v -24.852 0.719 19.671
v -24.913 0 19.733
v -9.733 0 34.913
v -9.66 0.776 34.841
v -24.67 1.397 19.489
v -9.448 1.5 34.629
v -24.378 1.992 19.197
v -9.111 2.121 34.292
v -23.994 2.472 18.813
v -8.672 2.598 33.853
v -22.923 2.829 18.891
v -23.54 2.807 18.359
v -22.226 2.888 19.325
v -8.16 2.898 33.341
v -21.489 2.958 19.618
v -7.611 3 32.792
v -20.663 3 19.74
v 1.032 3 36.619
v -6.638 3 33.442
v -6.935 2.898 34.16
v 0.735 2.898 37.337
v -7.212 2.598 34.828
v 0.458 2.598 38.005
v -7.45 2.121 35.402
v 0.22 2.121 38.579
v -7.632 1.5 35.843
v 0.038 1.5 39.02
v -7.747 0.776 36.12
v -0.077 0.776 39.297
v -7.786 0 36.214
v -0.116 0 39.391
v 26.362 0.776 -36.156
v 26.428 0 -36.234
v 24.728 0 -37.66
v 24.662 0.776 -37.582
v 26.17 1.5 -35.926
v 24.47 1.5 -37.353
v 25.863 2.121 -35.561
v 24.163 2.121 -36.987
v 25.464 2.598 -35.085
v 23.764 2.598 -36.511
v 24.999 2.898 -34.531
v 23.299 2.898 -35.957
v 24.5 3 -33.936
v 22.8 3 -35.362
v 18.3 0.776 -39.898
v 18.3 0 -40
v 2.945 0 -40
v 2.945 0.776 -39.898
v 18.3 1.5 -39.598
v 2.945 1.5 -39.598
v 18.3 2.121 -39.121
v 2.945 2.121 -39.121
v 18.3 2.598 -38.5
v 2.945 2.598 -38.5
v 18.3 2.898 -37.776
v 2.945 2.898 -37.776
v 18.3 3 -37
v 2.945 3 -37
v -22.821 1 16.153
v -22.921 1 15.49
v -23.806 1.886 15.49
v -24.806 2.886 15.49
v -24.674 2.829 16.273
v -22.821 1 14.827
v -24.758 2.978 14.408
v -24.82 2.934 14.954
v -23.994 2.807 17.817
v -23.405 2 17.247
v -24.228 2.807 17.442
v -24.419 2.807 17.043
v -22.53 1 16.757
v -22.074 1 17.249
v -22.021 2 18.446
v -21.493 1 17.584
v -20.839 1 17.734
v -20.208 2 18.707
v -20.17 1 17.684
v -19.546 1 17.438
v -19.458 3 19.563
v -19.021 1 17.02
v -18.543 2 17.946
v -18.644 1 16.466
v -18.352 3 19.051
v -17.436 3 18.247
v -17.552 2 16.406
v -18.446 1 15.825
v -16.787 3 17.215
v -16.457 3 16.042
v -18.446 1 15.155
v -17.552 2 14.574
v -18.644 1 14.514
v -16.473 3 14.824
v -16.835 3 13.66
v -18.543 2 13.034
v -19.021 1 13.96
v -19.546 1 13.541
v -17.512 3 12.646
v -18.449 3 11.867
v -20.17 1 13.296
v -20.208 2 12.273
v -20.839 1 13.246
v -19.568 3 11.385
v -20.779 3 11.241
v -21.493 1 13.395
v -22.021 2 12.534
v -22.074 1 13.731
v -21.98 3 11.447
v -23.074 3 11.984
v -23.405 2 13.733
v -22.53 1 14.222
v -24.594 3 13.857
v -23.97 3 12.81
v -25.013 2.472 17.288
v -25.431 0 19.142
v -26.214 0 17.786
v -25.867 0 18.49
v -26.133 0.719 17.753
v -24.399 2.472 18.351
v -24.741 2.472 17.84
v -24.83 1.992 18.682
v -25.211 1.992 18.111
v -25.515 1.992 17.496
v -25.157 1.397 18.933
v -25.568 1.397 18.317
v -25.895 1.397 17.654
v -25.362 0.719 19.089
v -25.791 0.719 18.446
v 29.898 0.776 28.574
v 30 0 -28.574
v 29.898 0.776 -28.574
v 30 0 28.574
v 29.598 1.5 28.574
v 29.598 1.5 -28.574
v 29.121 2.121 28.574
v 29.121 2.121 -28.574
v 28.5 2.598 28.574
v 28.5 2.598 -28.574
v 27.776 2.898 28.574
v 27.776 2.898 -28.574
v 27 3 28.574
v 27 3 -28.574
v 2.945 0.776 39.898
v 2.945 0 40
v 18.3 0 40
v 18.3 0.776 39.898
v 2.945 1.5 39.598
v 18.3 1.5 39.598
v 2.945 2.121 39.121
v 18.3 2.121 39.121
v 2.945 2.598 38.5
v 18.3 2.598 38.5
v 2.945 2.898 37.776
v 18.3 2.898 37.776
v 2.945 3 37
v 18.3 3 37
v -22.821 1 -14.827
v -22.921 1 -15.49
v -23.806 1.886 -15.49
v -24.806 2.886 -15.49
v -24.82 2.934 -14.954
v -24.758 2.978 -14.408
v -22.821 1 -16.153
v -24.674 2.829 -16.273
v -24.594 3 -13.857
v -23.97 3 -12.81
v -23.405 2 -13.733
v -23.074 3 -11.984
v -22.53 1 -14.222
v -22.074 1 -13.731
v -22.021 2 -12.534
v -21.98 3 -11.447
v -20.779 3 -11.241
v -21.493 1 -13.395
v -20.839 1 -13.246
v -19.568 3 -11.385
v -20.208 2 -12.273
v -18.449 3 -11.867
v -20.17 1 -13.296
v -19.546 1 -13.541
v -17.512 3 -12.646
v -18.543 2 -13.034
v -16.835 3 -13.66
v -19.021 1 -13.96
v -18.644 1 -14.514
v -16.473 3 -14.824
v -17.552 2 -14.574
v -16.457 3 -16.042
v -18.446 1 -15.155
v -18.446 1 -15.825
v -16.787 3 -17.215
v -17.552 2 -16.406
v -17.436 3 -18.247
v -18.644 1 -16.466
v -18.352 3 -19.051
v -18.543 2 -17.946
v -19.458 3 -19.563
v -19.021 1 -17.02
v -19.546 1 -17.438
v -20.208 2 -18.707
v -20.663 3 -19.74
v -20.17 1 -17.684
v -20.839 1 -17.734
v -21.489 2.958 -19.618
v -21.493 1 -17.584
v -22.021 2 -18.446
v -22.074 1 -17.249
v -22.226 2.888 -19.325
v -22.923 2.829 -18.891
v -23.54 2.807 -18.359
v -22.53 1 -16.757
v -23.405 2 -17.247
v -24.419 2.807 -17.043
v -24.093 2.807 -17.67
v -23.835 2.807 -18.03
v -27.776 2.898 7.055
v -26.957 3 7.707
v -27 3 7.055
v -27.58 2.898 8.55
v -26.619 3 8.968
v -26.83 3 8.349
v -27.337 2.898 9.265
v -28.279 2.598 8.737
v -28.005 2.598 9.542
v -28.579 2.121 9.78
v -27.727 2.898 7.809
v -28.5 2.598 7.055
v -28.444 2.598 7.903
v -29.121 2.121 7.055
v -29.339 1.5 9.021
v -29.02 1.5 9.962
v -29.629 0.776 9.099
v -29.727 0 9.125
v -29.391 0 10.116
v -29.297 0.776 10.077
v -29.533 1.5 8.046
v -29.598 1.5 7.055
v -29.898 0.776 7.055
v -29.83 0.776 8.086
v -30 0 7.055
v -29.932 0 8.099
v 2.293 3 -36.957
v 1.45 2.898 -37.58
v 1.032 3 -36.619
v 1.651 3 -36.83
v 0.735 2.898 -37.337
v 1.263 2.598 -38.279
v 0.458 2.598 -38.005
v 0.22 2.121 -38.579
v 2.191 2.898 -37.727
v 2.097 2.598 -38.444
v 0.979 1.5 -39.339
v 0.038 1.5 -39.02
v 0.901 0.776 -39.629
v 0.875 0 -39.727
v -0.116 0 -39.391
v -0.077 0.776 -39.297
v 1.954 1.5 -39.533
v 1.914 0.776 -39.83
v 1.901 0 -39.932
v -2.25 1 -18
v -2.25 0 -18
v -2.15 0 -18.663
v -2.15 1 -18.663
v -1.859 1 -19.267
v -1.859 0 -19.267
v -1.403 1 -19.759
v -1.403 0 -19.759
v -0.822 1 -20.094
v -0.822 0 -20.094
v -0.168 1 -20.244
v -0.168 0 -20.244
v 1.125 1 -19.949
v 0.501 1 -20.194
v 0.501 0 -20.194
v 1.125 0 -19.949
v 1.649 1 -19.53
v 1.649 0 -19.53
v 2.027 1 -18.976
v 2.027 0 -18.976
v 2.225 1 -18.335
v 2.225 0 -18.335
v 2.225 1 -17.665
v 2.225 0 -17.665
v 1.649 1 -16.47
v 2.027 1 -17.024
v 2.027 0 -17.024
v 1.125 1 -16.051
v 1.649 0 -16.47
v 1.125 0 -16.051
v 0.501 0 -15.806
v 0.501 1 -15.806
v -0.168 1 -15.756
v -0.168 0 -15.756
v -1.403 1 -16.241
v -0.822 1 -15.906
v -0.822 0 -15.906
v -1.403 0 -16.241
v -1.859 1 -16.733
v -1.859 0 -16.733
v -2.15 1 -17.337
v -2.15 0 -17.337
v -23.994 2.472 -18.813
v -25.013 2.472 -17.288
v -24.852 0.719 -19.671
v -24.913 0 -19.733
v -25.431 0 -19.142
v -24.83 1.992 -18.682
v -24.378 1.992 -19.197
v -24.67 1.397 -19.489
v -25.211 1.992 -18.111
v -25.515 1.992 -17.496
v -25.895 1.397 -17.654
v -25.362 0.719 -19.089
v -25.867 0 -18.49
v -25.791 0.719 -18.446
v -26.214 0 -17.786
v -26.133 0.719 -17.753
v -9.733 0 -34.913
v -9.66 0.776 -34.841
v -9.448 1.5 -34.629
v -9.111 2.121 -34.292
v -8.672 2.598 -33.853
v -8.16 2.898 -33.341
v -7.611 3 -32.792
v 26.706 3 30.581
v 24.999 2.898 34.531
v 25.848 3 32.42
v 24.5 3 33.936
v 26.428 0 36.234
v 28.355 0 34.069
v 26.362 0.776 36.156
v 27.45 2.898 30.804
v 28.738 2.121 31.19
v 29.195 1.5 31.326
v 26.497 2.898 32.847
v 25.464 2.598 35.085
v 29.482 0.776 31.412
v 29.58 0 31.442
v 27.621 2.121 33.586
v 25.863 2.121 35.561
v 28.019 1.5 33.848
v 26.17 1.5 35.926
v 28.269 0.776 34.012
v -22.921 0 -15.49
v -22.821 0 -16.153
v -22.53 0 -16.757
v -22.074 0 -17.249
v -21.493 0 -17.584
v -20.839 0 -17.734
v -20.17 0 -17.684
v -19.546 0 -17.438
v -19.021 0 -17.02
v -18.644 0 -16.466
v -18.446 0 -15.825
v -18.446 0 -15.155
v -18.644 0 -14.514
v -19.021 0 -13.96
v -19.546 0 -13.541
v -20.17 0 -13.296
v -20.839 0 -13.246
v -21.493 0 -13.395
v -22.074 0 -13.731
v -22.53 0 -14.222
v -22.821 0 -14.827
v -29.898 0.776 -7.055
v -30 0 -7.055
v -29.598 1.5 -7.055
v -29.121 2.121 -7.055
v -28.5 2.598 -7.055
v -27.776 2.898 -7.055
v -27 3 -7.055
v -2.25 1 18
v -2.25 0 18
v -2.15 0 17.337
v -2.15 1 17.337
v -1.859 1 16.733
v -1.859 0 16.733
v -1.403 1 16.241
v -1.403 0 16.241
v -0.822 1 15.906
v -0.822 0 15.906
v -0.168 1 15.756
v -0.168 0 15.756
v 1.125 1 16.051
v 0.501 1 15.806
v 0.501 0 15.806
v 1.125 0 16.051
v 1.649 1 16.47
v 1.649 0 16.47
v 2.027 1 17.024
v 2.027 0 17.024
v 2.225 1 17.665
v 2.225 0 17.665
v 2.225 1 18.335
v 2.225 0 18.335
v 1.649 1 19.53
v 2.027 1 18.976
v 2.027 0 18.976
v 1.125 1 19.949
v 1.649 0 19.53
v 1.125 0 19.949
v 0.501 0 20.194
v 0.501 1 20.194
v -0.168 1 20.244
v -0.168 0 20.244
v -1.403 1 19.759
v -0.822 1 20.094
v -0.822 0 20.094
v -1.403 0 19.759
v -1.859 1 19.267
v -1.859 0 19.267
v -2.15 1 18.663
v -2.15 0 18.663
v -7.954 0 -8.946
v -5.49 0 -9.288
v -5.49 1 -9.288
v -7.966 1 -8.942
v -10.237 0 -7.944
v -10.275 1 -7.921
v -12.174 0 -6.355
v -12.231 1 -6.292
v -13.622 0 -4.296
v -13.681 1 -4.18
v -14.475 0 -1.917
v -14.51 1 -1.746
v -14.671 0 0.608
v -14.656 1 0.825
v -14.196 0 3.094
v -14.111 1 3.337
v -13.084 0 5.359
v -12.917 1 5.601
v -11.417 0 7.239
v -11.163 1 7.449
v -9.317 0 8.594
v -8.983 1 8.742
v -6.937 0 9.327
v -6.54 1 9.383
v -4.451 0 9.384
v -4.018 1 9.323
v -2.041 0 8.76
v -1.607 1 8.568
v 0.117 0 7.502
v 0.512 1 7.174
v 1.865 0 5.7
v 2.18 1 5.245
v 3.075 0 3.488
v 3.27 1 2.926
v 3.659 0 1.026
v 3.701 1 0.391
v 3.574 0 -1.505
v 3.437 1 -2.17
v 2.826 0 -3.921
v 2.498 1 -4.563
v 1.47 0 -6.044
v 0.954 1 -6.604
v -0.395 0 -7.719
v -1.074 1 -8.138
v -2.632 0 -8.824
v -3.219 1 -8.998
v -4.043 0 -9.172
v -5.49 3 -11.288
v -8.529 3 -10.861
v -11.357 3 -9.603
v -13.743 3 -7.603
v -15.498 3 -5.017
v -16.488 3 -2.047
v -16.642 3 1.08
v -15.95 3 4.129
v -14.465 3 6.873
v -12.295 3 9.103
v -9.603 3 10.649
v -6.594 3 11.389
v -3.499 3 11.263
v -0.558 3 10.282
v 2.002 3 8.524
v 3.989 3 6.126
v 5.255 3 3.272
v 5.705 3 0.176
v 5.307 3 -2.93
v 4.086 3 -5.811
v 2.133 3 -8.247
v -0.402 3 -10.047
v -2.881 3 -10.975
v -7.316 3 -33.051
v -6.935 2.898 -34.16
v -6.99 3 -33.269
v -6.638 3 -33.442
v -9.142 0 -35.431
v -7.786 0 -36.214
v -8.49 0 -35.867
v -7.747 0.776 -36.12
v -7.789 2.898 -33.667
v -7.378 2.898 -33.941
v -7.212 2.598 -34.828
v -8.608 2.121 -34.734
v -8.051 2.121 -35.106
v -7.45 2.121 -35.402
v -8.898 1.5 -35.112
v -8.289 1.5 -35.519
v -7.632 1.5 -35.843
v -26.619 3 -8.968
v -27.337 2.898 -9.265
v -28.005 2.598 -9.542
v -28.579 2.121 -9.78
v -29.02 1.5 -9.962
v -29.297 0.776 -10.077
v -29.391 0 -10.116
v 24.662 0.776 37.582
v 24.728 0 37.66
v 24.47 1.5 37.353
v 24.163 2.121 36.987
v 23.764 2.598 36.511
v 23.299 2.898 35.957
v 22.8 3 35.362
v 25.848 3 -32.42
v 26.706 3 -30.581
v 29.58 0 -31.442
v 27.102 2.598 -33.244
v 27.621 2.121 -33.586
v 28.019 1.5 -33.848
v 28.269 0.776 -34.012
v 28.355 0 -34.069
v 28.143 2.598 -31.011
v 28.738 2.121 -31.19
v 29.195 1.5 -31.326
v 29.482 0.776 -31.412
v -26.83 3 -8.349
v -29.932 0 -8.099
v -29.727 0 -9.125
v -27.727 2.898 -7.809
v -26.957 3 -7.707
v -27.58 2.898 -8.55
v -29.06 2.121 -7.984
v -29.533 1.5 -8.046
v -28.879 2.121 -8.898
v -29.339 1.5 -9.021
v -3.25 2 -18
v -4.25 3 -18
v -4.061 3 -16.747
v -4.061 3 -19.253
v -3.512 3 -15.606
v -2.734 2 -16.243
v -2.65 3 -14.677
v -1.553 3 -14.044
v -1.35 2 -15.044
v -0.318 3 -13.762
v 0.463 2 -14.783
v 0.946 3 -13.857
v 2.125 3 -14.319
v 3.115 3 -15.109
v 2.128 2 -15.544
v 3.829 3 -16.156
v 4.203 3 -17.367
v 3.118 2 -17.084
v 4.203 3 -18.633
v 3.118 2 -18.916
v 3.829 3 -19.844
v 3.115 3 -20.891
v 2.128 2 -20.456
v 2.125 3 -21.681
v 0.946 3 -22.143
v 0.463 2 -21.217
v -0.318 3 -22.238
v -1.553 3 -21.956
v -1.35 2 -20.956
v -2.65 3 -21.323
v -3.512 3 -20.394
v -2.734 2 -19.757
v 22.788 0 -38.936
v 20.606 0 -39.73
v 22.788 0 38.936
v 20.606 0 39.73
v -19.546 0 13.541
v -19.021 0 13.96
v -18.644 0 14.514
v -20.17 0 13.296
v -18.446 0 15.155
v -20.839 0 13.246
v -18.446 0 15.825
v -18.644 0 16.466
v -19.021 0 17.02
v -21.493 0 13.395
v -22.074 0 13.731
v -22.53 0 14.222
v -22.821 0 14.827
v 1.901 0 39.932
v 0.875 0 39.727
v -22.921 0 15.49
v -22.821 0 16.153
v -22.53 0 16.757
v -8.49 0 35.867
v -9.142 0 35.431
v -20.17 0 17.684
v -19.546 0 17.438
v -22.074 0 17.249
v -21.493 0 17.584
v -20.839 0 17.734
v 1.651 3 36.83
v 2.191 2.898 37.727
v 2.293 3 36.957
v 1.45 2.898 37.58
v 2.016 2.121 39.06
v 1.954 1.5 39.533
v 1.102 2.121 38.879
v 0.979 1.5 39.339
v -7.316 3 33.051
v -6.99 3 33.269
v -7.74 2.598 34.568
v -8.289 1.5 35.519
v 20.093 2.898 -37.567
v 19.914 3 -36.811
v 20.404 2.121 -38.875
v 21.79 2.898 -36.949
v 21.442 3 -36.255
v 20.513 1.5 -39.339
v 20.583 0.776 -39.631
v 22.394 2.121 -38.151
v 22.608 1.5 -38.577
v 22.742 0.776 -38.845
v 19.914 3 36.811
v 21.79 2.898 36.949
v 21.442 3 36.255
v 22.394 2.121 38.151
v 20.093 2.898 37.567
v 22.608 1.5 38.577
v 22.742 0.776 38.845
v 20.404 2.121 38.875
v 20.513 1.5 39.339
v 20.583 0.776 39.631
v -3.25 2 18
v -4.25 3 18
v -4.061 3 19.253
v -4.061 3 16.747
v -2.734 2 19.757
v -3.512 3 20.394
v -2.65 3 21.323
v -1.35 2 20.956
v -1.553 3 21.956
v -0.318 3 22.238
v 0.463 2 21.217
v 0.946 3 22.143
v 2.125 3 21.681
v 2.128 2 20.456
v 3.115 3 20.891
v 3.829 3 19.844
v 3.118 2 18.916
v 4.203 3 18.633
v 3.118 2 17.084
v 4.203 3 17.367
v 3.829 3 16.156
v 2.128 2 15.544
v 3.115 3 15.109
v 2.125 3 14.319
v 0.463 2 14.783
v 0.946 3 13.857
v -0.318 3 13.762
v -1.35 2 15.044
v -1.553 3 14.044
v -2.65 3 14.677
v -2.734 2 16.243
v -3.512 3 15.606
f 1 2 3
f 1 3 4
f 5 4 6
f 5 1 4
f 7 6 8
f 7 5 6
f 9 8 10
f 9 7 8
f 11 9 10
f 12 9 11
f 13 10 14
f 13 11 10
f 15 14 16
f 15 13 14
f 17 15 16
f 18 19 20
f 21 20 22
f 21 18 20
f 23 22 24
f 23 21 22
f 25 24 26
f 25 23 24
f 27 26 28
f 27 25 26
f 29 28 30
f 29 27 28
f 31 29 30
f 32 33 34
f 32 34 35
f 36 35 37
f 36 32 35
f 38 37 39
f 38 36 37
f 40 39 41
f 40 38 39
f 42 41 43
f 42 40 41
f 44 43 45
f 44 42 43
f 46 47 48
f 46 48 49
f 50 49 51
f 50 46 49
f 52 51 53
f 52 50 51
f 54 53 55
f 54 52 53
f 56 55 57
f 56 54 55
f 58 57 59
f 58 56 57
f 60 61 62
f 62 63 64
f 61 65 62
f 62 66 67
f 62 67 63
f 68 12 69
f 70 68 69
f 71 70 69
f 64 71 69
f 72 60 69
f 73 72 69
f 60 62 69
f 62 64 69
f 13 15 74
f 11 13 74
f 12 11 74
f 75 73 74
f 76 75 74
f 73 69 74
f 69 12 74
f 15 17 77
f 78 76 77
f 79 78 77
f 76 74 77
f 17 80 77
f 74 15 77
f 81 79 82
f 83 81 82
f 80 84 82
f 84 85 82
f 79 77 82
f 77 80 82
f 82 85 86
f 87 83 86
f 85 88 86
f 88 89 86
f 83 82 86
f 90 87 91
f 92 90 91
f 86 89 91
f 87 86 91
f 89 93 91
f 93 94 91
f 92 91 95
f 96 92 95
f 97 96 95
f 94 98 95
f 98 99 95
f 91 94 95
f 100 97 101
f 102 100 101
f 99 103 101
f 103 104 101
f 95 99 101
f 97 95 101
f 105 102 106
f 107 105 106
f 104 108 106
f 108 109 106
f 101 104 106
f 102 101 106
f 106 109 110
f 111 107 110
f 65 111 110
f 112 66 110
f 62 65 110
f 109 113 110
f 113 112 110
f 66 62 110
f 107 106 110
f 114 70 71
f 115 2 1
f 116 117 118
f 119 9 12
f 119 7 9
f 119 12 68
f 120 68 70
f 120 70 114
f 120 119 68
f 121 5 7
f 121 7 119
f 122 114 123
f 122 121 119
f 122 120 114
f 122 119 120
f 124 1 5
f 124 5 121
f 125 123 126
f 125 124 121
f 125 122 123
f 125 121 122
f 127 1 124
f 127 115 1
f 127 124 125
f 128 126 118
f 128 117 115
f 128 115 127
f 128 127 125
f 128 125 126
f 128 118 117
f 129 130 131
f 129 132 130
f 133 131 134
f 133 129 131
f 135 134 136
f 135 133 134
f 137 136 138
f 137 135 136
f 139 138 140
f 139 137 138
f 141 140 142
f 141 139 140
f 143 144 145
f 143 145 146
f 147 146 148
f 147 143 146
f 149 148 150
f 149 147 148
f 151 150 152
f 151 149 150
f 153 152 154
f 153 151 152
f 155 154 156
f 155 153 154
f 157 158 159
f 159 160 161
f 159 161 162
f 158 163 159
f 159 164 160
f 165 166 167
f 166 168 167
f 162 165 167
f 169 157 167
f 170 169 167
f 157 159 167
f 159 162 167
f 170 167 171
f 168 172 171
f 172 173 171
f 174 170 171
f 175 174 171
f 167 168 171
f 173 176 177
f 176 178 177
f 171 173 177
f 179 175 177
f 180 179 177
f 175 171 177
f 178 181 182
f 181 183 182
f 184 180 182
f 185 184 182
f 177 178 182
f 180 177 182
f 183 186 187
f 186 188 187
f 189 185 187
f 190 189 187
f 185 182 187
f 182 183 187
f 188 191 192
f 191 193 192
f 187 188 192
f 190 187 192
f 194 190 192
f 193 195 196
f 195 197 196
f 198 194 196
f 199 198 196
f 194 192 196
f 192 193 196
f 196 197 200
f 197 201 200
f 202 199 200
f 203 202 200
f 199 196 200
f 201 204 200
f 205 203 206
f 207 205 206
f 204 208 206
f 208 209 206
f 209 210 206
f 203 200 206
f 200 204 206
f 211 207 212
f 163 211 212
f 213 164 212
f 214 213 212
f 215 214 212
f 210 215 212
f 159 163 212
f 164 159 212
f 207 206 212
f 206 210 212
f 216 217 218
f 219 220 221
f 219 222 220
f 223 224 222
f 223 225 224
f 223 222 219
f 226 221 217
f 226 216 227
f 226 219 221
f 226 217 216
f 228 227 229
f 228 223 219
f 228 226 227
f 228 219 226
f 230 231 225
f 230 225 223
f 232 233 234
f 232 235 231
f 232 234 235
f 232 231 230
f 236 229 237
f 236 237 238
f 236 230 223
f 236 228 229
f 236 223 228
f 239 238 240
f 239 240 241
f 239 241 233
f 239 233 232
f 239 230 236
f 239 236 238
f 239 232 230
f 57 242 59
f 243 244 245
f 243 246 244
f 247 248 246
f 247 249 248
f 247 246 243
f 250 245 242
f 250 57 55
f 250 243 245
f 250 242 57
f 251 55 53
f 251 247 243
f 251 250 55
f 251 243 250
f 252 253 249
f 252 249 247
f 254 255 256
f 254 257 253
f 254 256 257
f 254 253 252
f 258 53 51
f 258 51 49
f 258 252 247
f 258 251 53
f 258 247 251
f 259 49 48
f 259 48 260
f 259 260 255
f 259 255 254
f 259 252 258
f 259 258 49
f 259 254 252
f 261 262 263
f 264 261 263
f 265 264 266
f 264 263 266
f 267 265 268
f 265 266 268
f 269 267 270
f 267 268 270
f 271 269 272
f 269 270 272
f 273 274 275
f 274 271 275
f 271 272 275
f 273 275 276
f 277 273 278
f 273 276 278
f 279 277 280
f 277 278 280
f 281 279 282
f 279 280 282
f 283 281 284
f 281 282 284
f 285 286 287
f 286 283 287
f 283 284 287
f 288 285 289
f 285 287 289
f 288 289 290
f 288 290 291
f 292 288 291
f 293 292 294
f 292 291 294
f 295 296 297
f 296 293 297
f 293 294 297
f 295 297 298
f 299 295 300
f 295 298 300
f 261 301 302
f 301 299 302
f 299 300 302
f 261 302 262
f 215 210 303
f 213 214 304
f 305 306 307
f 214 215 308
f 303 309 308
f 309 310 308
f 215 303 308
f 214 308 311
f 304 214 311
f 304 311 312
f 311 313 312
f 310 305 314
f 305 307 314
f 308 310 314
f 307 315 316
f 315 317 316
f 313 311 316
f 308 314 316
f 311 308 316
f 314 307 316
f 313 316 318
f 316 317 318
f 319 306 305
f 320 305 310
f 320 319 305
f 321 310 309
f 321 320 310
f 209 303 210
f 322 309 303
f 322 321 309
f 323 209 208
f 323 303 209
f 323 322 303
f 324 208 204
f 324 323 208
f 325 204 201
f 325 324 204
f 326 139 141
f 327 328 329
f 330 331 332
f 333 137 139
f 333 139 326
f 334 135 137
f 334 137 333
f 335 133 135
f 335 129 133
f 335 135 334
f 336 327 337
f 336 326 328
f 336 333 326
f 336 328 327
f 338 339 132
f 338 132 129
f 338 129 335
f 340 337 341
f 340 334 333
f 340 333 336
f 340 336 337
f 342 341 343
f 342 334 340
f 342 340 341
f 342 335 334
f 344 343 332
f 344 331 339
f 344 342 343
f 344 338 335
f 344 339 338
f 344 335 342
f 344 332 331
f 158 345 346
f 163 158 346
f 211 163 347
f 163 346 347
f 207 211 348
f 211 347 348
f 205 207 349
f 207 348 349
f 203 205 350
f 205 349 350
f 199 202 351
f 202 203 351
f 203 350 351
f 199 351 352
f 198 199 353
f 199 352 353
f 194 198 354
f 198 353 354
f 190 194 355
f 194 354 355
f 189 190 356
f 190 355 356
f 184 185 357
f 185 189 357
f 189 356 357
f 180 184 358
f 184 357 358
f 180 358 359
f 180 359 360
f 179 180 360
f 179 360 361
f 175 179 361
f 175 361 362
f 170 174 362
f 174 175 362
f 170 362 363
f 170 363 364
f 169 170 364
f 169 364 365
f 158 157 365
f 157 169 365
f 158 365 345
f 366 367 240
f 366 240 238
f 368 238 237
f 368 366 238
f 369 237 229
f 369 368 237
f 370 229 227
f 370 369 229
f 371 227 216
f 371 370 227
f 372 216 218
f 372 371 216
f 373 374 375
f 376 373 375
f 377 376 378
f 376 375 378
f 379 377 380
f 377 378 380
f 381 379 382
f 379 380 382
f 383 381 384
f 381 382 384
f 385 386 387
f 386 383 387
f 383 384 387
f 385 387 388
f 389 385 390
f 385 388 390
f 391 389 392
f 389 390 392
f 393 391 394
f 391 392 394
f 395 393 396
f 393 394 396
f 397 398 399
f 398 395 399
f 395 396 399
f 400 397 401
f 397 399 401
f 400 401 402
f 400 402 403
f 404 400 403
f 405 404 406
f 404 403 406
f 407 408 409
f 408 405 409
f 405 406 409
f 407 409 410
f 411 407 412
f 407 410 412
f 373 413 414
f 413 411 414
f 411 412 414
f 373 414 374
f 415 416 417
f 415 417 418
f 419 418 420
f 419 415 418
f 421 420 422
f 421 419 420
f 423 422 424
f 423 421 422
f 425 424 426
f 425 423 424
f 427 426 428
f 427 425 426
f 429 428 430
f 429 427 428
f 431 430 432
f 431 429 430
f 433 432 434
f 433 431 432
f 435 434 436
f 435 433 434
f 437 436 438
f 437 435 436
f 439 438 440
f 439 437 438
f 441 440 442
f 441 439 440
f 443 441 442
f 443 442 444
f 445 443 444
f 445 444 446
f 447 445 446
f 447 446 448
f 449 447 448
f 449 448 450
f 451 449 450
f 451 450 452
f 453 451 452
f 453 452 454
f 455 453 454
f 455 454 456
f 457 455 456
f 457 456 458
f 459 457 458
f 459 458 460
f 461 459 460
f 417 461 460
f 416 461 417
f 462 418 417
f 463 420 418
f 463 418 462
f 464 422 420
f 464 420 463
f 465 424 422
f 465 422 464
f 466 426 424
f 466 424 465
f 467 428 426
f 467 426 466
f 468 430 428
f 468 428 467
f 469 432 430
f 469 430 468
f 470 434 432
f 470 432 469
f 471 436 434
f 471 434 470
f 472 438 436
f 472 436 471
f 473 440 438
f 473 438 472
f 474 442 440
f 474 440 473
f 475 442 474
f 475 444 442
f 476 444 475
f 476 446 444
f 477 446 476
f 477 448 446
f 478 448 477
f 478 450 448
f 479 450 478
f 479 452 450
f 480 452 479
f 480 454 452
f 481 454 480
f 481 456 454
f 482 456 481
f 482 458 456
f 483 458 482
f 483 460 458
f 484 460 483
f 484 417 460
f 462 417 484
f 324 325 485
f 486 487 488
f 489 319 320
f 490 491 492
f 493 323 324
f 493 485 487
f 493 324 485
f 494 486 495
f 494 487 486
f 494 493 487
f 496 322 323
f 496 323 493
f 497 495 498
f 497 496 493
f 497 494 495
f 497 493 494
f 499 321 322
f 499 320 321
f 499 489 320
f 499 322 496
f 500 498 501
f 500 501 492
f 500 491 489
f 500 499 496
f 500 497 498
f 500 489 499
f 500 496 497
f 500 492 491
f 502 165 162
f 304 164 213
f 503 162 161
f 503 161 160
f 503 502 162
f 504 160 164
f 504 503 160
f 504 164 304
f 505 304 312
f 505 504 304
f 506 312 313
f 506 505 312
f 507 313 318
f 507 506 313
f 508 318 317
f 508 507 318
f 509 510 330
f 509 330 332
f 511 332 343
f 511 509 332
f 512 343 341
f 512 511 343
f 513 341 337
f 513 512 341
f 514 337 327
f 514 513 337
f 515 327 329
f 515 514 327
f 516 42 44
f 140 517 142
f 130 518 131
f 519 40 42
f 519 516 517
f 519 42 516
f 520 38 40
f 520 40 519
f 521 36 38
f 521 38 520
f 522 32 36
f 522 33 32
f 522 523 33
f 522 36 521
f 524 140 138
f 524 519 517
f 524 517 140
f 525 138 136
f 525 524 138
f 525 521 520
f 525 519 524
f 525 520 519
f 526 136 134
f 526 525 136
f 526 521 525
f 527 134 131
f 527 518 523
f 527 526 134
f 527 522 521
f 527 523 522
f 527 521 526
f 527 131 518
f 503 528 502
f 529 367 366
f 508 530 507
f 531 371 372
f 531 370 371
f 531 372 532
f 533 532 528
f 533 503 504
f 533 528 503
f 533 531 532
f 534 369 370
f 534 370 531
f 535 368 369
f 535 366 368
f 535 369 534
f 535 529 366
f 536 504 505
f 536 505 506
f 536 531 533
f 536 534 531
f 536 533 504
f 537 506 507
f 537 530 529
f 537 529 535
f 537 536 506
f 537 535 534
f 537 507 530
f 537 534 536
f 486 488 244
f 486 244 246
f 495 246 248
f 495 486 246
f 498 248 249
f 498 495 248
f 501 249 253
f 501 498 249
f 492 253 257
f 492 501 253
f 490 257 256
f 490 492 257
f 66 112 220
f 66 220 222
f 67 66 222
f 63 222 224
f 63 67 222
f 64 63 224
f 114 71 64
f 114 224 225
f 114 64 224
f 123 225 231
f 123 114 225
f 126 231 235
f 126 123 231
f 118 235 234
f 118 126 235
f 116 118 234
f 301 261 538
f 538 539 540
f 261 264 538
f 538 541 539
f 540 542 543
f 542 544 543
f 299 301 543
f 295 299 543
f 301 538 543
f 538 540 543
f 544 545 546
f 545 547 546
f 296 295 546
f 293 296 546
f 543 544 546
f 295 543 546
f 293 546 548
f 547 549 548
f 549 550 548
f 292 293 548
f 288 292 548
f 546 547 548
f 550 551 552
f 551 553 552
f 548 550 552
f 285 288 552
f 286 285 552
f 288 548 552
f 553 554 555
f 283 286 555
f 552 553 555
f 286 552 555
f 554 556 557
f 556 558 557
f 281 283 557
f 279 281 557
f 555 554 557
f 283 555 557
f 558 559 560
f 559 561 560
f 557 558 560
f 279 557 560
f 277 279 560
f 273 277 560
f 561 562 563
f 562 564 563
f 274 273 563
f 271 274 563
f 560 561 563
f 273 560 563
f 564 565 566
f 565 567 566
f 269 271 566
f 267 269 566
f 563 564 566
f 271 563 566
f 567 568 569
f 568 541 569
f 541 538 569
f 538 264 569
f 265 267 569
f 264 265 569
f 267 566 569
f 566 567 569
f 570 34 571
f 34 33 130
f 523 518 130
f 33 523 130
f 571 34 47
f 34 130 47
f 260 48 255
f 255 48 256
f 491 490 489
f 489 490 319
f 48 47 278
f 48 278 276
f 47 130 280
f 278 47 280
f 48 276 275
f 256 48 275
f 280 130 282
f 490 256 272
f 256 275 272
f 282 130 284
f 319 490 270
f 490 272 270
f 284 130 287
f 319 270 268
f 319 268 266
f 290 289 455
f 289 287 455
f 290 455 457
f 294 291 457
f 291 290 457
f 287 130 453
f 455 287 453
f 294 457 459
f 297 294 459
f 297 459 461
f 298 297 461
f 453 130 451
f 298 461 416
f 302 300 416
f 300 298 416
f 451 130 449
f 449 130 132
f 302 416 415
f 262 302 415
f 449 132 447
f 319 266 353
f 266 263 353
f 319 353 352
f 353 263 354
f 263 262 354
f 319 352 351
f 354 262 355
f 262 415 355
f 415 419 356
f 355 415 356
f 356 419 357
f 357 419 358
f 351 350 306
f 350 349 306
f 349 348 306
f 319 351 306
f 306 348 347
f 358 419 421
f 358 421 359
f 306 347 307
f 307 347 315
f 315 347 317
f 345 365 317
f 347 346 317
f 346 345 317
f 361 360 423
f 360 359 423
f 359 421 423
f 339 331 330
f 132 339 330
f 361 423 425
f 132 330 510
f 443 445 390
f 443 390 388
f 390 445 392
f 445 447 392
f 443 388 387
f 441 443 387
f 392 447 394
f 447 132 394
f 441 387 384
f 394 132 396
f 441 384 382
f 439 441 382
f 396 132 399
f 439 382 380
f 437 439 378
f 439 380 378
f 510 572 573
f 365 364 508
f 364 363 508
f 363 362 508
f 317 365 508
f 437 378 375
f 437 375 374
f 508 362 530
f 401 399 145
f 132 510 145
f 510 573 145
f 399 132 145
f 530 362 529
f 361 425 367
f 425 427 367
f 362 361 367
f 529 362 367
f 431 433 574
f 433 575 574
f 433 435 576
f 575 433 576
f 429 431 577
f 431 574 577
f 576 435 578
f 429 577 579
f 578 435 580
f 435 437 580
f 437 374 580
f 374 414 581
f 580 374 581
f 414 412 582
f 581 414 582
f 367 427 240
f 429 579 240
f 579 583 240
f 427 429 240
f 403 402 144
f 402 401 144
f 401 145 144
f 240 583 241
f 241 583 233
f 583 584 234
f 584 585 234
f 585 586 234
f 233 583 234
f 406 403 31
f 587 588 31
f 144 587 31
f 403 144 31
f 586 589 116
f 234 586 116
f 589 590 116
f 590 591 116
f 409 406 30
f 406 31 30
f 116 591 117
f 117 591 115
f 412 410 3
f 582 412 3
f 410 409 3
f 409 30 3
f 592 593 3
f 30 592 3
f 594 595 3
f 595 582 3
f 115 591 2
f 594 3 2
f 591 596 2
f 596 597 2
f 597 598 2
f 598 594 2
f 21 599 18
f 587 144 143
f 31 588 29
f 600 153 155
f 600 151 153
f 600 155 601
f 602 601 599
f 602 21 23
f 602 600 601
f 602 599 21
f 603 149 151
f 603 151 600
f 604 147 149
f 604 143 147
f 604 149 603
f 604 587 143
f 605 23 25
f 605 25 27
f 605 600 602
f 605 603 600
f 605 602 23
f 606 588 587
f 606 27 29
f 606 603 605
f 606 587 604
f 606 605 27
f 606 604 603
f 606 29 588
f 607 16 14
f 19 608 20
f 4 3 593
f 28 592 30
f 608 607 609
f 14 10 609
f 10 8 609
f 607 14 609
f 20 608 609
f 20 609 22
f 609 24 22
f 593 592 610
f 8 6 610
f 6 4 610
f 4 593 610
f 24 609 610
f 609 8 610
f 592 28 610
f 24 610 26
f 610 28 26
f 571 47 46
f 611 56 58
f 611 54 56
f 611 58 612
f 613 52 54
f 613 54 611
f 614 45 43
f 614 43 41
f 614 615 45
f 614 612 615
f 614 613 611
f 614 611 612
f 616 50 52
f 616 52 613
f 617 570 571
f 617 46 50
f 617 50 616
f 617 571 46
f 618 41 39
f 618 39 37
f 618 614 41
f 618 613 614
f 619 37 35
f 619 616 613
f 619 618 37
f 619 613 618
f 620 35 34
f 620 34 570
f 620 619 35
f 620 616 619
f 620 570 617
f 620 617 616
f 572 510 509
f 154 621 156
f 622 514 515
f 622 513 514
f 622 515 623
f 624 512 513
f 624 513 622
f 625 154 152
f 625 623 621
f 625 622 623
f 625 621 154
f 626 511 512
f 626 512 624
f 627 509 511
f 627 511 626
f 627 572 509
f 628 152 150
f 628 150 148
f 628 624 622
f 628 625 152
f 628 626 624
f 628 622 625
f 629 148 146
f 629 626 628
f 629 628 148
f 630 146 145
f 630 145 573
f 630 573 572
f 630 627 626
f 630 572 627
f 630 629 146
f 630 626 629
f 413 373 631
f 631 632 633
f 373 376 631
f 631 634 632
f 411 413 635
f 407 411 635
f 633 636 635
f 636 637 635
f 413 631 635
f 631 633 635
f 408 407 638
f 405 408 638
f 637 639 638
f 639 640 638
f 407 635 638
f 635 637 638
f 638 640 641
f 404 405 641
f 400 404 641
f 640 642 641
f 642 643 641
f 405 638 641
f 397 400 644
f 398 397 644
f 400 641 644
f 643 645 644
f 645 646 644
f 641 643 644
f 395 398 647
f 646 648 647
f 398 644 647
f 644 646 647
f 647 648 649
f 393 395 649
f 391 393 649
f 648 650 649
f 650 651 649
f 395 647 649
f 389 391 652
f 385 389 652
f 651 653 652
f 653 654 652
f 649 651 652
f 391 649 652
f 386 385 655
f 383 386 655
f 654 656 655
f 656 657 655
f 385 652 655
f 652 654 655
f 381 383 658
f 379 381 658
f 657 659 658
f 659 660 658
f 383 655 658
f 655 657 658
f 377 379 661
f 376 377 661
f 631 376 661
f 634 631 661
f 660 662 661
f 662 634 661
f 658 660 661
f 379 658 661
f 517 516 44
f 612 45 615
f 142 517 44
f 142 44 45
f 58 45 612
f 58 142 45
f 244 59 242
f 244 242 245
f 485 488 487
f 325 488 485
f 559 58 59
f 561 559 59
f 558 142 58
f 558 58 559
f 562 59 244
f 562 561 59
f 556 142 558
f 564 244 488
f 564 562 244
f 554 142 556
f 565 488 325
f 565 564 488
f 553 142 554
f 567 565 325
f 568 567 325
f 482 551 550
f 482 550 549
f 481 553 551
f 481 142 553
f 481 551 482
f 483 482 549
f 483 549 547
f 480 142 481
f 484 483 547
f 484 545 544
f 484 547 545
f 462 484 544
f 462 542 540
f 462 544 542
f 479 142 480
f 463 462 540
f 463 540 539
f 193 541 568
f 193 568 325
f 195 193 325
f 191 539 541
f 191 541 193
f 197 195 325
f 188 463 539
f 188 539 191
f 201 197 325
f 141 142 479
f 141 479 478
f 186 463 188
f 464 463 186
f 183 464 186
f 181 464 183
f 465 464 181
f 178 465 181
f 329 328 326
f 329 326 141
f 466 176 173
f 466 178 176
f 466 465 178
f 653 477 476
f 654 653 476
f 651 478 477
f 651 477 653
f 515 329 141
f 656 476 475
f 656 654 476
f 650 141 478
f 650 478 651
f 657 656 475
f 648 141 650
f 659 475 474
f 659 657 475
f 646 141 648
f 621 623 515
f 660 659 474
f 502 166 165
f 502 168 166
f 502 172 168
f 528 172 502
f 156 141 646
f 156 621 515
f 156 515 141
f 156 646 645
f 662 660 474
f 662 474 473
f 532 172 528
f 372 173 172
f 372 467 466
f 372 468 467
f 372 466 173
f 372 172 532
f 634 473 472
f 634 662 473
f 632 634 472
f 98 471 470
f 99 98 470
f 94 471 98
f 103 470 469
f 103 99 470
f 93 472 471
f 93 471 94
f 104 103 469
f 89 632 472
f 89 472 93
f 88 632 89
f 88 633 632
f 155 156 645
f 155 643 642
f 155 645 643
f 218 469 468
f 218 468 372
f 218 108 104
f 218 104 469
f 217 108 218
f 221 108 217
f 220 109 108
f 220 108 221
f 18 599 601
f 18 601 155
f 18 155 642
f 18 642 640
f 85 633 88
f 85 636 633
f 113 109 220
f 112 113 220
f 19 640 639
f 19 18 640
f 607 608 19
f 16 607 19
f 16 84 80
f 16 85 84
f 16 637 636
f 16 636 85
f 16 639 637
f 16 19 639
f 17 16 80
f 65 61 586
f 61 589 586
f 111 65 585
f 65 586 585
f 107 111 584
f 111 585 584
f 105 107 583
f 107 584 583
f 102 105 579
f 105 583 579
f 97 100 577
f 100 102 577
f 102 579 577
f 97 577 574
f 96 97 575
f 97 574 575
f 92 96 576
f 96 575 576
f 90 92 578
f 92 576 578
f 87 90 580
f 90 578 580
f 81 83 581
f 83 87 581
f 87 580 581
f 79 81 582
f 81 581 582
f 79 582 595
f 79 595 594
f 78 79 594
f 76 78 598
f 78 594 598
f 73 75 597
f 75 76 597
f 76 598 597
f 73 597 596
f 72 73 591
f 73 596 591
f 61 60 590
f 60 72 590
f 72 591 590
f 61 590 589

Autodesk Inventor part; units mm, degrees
ref_plane "YZ Plane" through (0, 0, 0) normal (1, 0, 0) x (0, 1, 0)
ref_plane "XZ Plane" through (0, 0, 0) normal (0, 1, 0) x (-1, 0, 0)
ref_plane "XY Plane" through (0, 0, 0) normal (0, 0, 1) x (1, 0, 0)
sketch "Szkic1" plane through (0, 0, 0) normal (0, 1, 0) x (-1, 0, 0)
  circle A0 centre (20.670805, 15.489913) radius 2.25
  circle A1 centre (20.670805, -15.489913) radius 2.25
  line L0 (-2.43121, 25.942308) -> (-19.284188, 11.800981)
  line L1 (-19.284188, 11.800981) -> (-28.926002, 23.291647)
  line L2 (-28.802745, 24.700479) -> (-28.926002, 23.291647)
  line L3 (-28.802745, 24.700479) -> (-12.715812, 38.199019)
  line L4 (-12.715812, 38.199019) -> (-2.43121, 25.942308)
  line L5 (-26.423342, -11) -> (-26.423342, 11)
  line L6 (-26.423342, 11) -> (-10.423342, 11)
  line L7 (-10.423342, 11) -> (-10.423342, -11)
  line L8 (-10.423342, -11) -> (-26.423342, -11)
  line L9 (-19.284188, -11.800981) -> (-2.43121, -25.942308)
  line L10 (-2.43121, -25.942308) -> (-12.715812, -38.199019)
  line L11 (-12.715812, -38.199019) -> (-28.802745, -24.700479)
  line L12 (-28.926002, -23.291647) -> (-28.802745, -24.700479)
  line L13 (-28.926002, -23.291647) -> (-19.284188, -11.800981)
  arc A2 (24.913446, -19.732553) -> (26.214082, -17.786013) centre (20.670805, -15.489913) ccw
  line L14 (29.391036, -10.116167) -> (26.214082, -17.786013)
  arc A3 (29.391036, -10.116167) -> (30, -7.0547) centre (22, -7.0547) ccw
  line L15 (30, -7.0547) -> (30, 7.0547)
  arc A4 (30, 7.0547) -> (29.391036, 10.116167) centre (22, 7.0547) ccw
  line L16 (26.214082, 17.786013) -> (29.391036, 10.116167)
  arc A5 (26.214082, 17.786013) -> (24.913446, 19.732553) centre (20.670805, 15.489913) ccw
  line L17 (24.913446, 19.732553) -> (9.732553, 34.913446)
  arc A6 (9.732553, 34.913446) -> (7.786013, 36.214082) centre (5.489913, 30.670805) ccw
  line L18 (0.116167, 39.391036) -> (7.786013, 36.214082)
  arc A7 (0.116167, 39.391036) -> (-2.9453, 40) centre (-2.9453, 32) ccw
  line L19 (-2.9453, 40) -> (-18.300026, 40)
  arc A8 (-18.300026, 40) -> (-24.727902, 37.660444) centre (-18.300026, 30) ccw
  line L20 (-24.727902, 37.660444) -> (-26.427876, 36.233997)
  arc A9 (-26.427876, 36.233997) -> (-30, 28.573552) centre (-20, 28.573552) ccw
  line L21 (-30, 28.573552) -> (-30, -28.573552)
  arc A10 (-30, -28.573552) -> (-26.427876, -36.233997) centre (-20, -28.573552) ccw
  line L22 (-26.427876, -36.233997) -> (-24.727902, -37.660444)
  arc A11 (-24.727902, -37.660444) -> (-18.300026, -40) centre (-18.300026, -30) ccw
  line L23 (-18.300026, -40) -> (-2.9453, -40)
  arc A12 (-2.9453, -40) -> (0.116167, -39.391036) centre (-2.9453, -32) ccw
  line L24 (7.786013, -36.214082) -> (0.116167, -39.391036)
  arc A13 (7.786013, -36.214082) -> (9.732553, -34.913446) centre (5.489913, -30.670805) ccw
  line L25 (9.732553, -34.913446) -> (24.913446, -19.732553)
  circle A14 centre (0, -18) radius 2.25
  circle A15 centre (0, 18) radius 2.25
  ellipse E0 centre (5.489913, 0.077944) end of major axis (-3.705883, 0.077944) minor radius 9.366229
  point P0 (0, 0)
  point P1 (0, 0)
extrude "Wyciągnięcie proste1" add sketch "Szkic1" along normal blind 3 contours L0 L1 L2 L3 L4 | L5 L6 L7 L8 | L9 L10 L11 L12 L13 | L25 A13 L24 A12 L23 A11 L22 A10 L21 A9 L20 A8 L19 A7 L18 A6 L17 A5 L16 A4 L15 A3 L14 A2
chamfer "Faza1" distance 2 angle 45 1 edges at (-5.4899, 3, 9.4442)
chamfer "Faza2" distance 2 angle 45 4 edges at (-18.4208, 3, 15.4899) (2.25, 3, 18) (-18.4208, 3, -15.4899) (2.25, 3, -18)
fillet "Zaokrąglenie1" radius 3 24 edges at (30, 3, 0) (29.0631, 3, -32.7997) (25.5779, 3, -36.9472) (21.7202, 3, -39.3969) (10.6227, 3, -40) (1.3846, 3, -39.8463) (-3.9511, 3, -37.8026) (-8.8233, 3, -35.6596) (-17.323, 3, -27.323) (-25.6596, 3, -18.8233) (-27.8026, 3, -13.9511) (-29.8463, 3, -8.6154) (-30, 3, 0) (-29.8463, 3, 8.6154) (-27.8026, 3, 13.9511) (-25.6596, 3, 18.8233) (-17.323, 3, 27.323) (-8.8233, 3, 35.6596) (-3.9511, 3, 37.8026) (1.3846, 3, 39.8463) (10.6227, 3, 40) (21.7202, 3, 39.3969) (25.5779, 3, 36.9472) (29.0631, 3, 32.7997)
properties part number "obudowa do czujnikow odleglosci v3,2 - przykrywka"
